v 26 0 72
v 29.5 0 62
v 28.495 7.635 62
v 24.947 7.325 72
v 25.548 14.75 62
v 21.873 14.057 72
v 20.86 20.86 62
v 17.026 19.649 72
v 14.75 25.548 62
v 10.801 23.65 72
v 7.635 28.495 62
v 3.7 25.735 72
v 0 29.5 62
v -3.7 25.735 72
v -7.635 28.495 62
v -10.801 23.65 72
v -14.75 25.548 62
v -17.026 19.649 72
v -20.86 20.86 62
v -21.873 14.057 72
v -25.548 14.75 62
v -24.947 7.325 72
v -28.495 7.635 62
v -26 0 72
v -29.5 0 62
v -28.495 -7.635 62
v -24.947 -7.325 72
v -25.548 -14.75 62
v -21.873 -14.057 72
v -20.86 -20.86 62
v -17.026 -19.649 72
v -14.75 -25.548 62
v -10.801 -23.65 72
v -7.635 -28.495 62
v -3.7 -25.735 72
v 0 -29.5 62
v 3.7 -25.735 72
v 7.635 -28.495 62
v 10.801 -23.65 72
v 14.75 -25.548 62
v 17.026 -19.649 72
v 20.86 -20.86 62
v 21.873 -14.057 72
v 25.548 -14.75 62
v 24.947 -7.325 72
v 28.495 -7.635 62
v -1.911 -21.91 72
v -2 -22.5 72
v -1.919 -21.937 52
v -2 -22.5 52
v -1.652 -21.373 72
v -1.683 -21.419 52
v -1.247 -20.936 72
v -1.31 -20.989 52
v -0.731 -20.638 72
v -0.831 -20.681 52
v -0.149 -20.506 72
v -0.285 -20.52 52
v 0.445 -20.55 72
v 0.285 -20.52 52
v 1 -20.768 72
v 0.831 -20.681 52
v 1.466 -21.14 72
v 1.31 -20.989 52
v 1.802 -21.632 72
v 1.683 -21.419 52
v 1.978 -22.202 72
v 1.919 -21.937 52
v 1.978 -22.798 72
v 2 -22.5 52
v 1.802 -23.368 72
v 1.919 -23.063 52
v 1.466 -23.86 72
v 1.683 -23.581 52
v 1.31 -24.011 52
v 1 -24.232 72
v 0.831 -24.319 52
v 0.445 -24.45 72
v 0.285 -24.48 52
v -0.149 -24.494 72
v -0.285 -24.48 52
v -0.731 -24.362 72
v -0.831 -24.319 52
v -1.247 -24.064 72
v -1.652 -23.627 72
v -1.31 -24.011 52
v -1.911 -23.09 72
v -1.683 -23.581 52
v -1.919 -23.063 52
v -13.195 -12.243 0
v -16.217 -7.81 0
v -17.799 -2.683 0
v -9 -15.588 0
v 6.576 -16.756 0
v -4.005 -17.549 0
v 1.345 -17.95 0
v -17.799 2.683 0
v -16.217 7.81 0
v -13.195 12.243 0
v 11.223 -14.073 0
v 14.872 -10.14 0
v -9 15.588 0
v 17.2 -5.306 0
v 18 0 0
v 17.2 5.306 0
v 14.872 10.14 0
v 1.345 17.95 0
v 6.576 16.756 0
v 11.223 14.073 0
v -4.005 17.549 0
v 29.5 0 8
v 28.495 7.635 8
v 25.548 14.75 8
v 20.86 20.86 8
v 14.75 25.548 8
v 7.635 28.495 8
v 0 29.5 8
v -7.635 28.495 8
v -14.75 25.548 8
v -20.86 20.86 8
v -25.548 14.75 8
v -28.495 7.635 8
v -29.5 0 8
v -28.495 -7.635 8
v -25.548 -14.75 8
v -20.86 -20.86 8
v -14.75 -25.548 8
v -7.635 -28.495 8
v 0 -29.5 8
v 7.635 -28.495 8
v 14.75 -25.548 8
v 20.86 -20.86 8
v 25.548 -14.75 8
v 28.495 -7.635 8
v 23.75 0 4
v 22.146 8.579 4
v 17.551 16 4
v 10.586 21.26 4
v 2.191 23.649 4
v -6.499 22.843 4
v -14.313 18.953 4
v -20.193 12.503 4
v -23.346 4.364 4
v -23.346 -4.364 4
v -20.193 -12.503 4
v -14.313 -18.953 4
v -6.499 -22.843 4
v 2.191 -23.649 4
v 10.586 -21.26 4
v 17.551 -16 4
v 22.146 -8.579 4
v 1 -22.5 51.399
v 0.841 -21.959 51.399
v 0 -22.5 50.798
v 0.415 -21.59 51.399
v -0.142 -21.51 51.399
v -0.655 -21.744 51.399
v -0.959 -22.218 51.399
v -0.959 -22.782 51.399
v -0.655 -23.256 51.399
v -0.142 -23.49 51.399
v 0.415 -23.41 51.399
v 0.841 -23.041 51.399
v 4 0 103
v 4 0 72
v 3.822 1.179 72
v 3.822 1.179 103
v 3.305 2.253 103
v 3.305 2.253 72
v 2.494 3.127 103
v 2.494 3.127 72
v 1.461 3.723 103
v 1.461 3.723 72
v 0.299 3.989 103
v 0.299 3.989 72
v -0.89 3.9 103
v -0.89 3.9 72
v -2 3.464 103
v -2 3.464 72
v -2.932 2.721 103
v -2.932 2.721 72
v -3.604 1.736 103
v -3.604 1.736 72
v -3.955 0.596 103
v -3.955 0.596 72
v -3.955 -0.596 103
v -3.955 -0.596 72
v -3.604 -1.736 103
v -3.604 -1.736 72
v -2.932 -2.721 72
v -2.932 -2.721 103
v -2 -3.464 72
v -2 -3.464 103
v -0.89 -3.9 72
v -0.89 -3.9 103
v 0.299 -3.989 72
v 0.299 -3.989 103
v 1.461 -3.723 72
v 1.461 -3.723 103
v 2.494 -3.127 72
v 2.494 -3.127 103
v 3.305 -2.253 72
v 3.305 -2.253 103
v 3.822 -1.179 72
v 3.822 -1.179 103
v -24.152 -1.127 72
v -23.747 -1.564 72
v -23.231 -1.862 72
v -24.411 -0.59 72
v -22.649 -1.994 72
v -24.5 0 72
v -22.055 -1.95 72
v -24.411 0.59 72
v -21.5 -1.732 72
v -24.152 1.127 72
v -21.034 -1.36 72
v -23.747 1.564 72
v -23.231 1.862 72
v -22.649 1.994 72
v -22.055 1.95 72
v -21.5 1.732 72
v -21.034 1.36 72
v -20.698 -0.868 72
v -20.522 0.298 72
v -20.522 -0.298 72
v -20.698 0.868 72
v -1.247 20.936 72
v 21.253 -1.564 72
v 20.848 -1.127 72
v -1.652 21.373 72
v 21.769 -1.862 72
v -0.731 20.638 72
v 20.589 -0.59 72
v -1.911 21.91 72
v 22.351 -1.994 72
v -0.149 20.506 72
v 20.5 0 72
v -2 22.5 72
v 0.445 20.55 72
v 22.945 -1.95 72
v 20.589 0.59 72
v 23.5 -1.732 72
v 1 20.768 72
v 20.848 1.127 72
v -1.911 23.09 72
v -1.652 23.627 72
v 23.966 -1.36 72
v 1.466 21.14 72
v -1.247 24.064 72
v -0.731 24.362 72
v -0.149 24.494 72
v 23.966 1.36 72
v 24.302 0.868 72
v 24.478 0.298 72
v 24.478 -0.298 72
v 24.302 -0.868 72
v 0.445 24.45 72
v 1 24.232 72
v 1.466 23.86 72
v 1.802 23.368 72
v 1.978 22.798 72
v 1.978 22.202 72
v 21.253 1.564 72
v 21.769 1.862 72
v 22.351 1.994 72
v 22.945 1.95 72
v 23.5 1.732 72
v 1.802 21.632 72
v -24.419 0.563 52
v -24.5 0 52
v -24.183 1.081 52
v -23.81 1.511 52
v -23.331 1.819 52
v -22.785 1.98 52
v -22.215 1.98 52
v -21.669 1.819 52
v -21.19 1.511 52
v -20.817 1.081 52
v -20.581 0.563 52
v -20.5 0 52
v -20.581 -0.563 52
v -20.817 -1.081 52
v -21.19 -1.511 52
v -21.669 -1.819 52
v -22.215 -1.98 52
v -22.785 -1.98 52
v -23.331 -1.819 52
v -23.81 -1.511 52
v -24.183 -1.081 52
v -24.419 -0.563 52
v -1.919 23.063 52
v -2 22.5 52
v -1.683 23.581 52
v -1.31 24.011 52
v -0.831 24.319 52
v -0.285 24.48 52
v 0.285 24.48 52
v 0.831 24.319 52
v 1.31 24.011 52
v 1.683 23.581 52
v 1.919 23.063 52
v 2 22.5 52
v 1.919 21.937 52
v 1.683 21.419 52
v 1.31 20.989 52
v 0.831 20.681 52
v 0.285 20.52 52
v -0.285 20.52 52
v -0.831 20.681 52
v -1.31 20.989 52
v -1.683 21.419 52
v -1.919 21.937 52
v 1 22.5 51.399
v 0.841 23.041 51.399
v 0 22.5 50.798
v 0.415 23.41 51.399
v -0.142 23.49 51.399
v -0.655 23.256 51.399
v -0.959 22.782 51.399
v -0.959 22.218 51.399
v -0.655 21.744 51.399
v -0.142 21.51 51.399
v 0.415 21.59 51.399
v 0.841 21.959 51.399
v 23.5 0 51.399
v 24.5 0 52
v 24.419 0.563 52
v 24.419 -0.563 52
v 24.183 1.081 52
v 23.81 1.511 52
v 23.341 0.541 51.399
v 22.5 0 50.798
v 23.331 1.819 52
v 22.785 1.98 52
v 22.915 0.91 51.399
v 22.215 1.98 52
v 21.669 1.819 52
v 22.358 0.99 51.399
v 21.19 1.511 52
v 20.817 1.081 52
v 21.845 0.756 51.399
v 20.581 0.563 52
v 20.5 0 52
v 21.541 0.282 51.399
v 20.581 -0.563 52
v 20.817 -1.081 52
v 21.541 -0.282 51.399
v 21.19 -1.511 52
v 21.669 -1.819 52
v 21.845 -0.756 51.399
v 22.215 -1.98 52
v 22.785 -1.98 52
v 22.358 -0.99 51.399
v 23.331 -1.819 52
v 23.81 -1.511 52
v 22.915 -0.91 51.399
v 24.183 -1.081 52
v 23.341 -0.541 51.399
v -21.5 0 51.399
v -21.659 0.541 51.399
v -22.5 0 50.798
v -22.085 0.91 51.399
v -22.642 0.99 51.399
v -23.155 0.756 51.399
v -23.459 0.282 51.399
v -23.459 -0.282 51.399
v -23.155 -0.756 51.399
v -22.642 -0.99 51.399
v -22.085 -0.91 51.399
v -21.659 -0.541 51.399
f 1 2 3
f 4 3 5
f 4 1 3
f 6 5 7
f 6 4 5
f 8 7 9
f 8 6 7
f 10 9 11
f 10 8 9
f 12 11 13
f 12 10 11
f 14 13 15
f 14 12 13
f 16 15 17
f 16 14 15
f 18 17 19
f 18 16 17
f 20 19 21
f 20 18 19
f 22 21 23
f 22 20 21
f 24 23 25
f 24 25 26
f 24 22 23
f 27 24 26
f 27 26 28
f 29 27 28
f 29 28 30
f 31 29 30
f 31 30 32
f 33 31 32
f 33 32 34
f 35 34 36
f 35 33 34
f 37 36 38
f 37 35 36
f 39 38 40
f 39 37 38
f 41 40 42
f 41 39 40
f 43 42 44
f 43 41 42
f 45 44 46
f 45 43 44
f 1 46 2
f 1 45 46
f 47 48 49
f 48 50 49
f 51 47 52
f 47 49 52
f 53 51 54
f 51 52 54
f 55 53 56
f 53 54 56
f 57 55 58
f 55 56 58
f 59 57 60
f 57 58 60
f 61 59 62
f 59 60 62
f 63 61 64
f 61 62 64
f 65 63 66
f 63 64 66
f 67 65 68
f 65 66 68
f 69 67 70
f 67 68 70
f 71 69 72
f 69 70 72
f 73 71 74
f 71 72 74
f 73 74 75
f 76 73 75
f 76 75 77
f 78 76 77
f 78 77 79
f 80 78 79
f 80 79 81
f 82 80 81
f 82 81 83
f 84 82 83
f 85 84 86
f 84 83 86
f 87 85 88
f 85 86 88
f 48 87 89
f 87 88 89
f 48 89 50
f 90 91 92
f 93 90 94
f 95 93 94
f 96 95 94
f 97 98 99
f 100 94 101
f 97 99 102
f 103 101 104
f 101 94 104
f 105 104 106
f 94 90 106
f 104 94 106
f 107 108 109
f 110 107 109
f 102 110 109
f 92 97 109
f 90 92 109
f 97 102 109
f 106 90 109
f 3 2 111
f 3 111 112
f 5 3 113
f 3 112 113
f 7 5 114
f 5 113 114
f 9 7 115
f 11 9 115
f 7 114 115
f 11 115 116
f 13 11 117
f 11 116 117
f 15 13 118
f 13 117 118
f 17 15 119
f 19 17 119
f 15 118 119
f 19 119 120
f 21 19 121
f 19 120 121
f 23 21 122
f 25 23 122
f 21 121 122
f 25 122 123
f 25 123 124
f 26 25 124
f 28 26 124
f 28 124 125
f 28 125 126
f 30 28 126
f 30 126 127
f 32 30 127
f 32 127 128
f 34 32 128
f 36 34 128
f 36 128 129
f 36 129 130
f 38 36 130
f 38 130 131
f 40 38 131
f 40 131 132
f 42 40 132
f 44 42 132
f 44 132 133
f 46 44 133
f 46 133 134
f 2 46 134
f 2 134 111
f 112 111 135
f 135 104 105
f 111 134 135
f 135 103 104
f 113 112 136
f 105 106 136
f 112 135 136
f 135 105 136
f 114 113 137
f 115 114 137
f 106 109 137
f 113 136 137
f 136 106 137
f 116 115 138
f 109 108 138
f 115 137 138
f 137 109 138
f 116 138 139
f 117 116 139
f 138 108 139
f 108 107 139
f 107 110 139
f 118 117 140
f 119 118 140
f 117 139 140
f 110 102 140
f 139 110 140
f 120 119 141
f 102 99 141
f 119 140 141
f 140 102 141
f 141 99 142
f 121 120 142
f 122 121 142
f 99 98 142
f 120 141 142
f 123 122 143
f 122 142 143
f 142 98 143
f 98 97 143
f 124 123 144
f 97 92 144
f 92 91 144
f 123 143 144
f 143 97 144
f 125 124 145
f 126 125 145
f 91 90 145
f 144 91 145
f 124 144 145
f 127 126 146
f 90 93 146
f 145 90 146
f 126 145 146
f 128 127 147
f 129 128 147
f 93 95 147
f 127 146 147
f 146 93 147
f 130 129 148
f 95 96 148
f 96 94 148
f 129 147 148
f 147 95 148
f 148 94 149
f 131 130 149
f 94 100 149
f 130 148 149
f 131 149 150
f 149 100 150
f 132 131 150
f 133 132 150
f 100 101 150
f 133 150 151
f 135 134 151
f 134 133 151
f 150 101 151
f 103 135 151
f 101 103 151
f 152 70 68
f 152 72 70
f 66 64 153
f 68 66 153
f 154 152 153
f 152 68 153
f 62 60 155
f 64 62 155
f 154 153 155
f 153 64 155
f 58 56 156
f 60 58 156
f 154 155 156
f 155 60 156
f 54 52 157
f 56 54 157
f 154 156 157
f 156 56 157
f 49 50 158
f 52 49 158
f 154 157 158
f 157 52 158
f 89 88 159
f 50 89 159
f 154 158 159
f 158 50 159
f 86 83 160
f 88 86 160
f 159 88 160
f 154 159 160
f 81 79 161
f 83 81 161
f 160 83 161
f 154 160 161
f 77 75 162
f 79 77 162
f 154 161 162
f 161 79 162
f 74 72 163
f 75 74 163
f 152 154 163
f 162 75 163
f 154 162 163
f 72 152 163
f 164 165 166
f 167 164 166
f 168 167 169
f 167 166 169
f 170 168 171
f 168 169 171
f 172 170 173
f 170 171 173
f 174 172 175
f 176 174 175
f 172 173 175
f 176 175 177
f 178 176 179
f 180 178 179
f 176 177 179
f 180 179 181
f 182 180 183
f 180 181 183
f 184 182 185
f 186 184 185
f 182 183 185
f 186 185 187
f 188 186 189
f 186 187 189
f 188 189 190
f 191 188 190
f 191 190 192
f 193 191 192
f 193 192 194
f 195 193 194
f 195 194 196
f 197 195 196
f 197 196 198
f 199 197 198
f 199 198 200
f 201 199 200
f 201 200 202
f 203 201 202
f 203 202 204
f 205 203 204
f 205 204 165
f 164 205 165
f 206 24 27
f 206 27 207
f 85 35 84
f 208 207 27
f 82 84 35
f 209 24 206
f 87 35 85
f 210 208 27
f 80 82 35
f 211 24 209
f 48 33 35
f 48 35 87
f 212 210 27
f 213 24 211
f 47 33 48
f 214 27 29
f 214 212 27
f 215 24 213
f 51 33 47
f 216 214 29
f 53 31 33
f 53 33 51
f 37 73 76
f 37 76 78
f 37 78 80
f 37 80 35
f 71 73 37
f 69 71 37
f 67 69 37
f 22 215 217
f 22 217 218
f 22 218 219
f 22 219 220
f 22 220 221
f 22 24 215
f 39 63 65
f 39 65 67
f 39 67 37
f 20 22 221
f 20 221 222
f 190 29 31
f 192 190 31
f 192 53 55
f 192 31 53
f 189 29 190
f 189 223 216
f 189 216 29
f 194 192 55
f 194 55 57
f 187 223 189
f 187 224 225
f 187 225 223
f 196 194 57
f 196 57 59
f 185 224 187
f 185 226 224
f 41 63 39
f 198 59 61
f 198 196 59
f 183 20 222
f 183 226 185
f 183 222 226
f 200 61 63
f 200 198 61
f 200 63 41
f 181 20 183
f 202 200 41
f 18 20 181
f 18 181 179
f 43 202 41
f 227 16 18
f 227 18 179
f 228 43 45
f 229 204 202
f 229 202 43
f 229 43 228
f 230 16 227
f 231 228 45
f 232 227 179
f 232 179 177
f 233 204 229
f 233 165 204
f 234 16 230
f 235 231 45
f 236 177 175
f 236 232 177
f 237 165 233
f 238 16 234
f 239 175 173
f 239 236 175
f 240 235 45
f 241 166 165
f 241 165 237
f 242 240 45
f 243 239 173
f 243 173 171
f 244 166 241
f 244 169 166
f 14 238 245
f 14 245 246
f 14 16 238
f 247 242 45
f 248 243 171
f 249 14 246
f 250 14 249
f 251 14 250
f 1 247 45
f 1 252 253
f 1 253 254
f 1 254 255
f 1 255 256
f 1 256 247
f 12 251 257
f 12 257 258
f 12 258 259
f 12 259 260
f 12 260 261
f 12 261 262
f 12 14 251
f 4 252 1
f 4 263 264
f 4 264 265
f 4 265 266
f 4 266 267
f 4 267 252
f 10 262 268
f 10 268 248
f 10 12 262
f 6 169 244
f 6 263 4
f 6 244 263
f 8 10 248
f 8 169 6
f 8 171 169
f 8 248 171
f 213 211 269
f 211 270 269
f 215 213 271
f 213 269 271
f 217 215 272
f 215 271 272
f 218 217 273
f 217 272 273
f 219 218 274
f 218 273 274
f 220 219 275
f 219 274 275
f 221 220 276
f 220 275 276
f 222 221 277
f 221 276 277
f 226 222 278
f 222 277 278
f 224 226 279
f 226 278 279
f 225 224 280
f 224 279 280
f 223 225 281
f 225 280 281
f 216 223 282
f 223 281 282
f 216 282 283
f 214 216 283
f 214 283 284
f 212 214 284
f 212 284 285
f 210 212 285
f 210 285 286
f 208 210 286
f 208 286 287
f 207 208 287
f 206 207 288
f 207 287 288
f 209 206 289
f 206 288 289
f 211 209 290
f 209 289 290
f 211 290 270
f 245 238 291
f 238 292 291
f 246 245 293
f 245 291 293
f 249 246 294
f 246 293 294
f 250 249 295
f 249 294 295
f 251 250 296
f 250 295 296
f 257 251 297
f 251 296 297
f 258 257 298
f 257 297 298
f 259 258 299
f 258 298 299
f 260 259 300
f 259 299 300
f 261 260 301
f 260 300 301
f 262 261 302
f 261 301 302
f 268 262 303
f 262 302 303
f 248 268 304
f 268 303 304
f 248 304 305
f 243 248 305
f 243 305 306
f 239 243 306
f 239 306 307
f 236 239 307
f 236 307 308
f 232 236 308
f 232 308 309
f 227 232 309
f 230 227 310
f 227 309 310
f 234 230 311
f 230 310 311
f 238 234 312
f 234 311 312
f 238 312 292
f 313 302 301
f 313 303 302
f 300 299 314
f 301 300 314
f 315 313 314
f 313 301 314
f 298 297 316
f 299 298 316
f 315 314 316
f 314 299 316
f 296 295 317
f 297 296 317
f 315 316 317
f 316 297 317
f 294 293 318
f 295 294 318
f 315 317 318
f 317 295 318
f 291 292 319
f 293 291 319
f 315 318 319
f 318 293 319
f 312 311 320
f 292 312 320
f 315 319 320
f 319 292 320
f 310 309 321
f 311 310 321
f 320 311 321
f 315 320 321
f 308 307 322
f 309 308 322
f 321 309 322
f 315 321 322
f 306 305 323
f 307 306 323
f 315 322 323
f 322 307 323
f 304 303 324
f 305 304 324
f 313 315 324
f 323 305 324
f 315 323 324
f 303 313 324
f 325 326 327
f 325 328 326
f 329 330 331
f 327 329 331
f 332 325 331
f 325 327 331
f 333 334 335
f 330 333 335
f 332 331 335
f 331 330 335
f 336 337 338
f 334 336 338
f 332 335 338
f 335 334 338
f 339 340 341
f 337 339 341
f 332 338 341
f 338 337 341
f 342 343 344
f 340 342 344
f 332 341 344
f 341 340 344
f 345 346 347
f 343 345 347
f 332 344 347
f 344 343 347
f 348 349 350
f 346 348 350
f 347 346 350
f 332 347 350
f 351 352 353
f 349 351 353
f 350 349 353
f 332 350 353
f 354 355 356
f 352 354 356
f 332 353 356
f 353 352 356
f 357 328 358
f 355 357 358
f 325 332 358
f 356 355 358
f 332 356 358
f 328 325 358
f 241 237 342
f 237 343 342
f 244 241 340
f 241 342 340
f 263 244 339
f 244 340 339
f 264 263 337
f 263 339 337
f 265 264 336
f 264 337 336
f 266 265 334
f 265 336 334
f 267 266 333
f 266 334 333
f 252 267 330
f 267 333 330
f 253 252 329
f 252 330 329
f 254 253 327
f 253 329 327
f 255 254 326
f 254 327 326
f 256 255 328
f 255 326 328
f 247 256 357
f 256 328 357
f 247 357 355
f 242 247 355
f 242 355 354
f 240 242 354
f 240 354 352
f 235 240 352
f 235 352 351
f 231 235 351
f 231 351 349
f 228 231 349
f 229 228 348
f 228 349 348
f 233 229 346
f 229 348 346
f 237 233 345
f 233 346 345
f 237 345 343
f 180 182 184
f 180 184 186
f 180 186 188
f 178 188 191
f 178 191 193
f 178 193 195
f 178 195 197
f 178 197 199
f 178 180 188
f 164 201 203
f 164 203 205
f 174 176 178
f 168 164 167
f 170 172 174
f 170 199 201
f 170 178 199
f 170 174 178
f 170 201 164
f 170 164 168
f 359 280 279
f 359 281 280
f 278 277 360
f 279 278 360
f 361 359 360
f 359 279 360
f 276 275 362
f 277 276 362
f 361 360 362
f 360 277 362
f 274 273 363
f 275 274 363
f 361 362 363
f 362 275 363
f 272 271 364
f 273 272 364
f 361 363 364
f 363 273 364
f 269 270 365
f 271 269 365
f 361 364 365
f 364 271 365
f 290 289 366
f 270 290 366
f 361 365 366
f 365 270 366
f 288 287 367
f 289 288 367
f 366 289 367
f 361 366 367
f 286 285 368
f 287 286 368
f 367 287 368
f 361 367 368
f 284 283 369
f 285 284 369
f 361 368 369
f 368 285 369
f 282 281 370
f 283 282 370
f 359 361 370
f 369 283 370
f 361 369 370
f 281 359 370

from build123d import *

# Parameters (mm, degrees)
F0_R     = 29.5
F1_DEPTH = 72
F3_SIZE2 = 11.5
F3_SIZE  = 8
F4_R     = 4
F5_DEPTH = 103
F7_D     = 4
F7_DEPTH = 20
F7_TIP   = 1.2017212381


# Not quite as in the source:
# - a fillet or chamfer that OpenCascade refuses, or shapes differently, is made with other operations: its cross-section is extruded or revolved along the edge and cut away or added


with BuildPart() as f1:
    # F0 (on Top) → F1 (new body)
    with BuildSketch(Plane.XY):
        Circle(F0_R)
    extrude(amount=F1_DEPTH)

    # F2: chamfer of 3.5 x 10 on 1 edges, made by hand

    # F2_s1 → F2_t2 (revolve, cut)
    with BuildSketch(Plane.XZ):
        Polygon((29.5, 62), (26, 72), (29.5, 72), align=None)
    revolve(axis=Axis((0, 0, 72), (0, 0, 1)), mode=Mode.SUBTRACT)

    # F3
    f3_edges = [f1.edges().sort_by_distance(p)[0] for p in [
        (-29.5, 0, 0),
    ]]
    chamfer(f3_edges, length=F3_SIZE, length2=F3_SIZE2)

    # F4 (on Top) → F5 (join)
    with BuildSketch(Plane.XY):
        Circle(F4_R)
    extrude(amount=F5_DEPTH)

    # F7
    with Locations(Plane.XY.offset(72)):
        with Locations((0, 22.5), (22.5, 0), (0, -22.5), (-22.5, 0)):
            Hole(F7_D / 2, depth=F7_DEPTH)
            with Locations((0, 0, -(F7_DEPTH + F7_TIP / 2))):  # 118° drill point
                Cone(0, F7_D / 2, F7_TIP, mode=Mode.SUBTRACT)


solid = f1.part
